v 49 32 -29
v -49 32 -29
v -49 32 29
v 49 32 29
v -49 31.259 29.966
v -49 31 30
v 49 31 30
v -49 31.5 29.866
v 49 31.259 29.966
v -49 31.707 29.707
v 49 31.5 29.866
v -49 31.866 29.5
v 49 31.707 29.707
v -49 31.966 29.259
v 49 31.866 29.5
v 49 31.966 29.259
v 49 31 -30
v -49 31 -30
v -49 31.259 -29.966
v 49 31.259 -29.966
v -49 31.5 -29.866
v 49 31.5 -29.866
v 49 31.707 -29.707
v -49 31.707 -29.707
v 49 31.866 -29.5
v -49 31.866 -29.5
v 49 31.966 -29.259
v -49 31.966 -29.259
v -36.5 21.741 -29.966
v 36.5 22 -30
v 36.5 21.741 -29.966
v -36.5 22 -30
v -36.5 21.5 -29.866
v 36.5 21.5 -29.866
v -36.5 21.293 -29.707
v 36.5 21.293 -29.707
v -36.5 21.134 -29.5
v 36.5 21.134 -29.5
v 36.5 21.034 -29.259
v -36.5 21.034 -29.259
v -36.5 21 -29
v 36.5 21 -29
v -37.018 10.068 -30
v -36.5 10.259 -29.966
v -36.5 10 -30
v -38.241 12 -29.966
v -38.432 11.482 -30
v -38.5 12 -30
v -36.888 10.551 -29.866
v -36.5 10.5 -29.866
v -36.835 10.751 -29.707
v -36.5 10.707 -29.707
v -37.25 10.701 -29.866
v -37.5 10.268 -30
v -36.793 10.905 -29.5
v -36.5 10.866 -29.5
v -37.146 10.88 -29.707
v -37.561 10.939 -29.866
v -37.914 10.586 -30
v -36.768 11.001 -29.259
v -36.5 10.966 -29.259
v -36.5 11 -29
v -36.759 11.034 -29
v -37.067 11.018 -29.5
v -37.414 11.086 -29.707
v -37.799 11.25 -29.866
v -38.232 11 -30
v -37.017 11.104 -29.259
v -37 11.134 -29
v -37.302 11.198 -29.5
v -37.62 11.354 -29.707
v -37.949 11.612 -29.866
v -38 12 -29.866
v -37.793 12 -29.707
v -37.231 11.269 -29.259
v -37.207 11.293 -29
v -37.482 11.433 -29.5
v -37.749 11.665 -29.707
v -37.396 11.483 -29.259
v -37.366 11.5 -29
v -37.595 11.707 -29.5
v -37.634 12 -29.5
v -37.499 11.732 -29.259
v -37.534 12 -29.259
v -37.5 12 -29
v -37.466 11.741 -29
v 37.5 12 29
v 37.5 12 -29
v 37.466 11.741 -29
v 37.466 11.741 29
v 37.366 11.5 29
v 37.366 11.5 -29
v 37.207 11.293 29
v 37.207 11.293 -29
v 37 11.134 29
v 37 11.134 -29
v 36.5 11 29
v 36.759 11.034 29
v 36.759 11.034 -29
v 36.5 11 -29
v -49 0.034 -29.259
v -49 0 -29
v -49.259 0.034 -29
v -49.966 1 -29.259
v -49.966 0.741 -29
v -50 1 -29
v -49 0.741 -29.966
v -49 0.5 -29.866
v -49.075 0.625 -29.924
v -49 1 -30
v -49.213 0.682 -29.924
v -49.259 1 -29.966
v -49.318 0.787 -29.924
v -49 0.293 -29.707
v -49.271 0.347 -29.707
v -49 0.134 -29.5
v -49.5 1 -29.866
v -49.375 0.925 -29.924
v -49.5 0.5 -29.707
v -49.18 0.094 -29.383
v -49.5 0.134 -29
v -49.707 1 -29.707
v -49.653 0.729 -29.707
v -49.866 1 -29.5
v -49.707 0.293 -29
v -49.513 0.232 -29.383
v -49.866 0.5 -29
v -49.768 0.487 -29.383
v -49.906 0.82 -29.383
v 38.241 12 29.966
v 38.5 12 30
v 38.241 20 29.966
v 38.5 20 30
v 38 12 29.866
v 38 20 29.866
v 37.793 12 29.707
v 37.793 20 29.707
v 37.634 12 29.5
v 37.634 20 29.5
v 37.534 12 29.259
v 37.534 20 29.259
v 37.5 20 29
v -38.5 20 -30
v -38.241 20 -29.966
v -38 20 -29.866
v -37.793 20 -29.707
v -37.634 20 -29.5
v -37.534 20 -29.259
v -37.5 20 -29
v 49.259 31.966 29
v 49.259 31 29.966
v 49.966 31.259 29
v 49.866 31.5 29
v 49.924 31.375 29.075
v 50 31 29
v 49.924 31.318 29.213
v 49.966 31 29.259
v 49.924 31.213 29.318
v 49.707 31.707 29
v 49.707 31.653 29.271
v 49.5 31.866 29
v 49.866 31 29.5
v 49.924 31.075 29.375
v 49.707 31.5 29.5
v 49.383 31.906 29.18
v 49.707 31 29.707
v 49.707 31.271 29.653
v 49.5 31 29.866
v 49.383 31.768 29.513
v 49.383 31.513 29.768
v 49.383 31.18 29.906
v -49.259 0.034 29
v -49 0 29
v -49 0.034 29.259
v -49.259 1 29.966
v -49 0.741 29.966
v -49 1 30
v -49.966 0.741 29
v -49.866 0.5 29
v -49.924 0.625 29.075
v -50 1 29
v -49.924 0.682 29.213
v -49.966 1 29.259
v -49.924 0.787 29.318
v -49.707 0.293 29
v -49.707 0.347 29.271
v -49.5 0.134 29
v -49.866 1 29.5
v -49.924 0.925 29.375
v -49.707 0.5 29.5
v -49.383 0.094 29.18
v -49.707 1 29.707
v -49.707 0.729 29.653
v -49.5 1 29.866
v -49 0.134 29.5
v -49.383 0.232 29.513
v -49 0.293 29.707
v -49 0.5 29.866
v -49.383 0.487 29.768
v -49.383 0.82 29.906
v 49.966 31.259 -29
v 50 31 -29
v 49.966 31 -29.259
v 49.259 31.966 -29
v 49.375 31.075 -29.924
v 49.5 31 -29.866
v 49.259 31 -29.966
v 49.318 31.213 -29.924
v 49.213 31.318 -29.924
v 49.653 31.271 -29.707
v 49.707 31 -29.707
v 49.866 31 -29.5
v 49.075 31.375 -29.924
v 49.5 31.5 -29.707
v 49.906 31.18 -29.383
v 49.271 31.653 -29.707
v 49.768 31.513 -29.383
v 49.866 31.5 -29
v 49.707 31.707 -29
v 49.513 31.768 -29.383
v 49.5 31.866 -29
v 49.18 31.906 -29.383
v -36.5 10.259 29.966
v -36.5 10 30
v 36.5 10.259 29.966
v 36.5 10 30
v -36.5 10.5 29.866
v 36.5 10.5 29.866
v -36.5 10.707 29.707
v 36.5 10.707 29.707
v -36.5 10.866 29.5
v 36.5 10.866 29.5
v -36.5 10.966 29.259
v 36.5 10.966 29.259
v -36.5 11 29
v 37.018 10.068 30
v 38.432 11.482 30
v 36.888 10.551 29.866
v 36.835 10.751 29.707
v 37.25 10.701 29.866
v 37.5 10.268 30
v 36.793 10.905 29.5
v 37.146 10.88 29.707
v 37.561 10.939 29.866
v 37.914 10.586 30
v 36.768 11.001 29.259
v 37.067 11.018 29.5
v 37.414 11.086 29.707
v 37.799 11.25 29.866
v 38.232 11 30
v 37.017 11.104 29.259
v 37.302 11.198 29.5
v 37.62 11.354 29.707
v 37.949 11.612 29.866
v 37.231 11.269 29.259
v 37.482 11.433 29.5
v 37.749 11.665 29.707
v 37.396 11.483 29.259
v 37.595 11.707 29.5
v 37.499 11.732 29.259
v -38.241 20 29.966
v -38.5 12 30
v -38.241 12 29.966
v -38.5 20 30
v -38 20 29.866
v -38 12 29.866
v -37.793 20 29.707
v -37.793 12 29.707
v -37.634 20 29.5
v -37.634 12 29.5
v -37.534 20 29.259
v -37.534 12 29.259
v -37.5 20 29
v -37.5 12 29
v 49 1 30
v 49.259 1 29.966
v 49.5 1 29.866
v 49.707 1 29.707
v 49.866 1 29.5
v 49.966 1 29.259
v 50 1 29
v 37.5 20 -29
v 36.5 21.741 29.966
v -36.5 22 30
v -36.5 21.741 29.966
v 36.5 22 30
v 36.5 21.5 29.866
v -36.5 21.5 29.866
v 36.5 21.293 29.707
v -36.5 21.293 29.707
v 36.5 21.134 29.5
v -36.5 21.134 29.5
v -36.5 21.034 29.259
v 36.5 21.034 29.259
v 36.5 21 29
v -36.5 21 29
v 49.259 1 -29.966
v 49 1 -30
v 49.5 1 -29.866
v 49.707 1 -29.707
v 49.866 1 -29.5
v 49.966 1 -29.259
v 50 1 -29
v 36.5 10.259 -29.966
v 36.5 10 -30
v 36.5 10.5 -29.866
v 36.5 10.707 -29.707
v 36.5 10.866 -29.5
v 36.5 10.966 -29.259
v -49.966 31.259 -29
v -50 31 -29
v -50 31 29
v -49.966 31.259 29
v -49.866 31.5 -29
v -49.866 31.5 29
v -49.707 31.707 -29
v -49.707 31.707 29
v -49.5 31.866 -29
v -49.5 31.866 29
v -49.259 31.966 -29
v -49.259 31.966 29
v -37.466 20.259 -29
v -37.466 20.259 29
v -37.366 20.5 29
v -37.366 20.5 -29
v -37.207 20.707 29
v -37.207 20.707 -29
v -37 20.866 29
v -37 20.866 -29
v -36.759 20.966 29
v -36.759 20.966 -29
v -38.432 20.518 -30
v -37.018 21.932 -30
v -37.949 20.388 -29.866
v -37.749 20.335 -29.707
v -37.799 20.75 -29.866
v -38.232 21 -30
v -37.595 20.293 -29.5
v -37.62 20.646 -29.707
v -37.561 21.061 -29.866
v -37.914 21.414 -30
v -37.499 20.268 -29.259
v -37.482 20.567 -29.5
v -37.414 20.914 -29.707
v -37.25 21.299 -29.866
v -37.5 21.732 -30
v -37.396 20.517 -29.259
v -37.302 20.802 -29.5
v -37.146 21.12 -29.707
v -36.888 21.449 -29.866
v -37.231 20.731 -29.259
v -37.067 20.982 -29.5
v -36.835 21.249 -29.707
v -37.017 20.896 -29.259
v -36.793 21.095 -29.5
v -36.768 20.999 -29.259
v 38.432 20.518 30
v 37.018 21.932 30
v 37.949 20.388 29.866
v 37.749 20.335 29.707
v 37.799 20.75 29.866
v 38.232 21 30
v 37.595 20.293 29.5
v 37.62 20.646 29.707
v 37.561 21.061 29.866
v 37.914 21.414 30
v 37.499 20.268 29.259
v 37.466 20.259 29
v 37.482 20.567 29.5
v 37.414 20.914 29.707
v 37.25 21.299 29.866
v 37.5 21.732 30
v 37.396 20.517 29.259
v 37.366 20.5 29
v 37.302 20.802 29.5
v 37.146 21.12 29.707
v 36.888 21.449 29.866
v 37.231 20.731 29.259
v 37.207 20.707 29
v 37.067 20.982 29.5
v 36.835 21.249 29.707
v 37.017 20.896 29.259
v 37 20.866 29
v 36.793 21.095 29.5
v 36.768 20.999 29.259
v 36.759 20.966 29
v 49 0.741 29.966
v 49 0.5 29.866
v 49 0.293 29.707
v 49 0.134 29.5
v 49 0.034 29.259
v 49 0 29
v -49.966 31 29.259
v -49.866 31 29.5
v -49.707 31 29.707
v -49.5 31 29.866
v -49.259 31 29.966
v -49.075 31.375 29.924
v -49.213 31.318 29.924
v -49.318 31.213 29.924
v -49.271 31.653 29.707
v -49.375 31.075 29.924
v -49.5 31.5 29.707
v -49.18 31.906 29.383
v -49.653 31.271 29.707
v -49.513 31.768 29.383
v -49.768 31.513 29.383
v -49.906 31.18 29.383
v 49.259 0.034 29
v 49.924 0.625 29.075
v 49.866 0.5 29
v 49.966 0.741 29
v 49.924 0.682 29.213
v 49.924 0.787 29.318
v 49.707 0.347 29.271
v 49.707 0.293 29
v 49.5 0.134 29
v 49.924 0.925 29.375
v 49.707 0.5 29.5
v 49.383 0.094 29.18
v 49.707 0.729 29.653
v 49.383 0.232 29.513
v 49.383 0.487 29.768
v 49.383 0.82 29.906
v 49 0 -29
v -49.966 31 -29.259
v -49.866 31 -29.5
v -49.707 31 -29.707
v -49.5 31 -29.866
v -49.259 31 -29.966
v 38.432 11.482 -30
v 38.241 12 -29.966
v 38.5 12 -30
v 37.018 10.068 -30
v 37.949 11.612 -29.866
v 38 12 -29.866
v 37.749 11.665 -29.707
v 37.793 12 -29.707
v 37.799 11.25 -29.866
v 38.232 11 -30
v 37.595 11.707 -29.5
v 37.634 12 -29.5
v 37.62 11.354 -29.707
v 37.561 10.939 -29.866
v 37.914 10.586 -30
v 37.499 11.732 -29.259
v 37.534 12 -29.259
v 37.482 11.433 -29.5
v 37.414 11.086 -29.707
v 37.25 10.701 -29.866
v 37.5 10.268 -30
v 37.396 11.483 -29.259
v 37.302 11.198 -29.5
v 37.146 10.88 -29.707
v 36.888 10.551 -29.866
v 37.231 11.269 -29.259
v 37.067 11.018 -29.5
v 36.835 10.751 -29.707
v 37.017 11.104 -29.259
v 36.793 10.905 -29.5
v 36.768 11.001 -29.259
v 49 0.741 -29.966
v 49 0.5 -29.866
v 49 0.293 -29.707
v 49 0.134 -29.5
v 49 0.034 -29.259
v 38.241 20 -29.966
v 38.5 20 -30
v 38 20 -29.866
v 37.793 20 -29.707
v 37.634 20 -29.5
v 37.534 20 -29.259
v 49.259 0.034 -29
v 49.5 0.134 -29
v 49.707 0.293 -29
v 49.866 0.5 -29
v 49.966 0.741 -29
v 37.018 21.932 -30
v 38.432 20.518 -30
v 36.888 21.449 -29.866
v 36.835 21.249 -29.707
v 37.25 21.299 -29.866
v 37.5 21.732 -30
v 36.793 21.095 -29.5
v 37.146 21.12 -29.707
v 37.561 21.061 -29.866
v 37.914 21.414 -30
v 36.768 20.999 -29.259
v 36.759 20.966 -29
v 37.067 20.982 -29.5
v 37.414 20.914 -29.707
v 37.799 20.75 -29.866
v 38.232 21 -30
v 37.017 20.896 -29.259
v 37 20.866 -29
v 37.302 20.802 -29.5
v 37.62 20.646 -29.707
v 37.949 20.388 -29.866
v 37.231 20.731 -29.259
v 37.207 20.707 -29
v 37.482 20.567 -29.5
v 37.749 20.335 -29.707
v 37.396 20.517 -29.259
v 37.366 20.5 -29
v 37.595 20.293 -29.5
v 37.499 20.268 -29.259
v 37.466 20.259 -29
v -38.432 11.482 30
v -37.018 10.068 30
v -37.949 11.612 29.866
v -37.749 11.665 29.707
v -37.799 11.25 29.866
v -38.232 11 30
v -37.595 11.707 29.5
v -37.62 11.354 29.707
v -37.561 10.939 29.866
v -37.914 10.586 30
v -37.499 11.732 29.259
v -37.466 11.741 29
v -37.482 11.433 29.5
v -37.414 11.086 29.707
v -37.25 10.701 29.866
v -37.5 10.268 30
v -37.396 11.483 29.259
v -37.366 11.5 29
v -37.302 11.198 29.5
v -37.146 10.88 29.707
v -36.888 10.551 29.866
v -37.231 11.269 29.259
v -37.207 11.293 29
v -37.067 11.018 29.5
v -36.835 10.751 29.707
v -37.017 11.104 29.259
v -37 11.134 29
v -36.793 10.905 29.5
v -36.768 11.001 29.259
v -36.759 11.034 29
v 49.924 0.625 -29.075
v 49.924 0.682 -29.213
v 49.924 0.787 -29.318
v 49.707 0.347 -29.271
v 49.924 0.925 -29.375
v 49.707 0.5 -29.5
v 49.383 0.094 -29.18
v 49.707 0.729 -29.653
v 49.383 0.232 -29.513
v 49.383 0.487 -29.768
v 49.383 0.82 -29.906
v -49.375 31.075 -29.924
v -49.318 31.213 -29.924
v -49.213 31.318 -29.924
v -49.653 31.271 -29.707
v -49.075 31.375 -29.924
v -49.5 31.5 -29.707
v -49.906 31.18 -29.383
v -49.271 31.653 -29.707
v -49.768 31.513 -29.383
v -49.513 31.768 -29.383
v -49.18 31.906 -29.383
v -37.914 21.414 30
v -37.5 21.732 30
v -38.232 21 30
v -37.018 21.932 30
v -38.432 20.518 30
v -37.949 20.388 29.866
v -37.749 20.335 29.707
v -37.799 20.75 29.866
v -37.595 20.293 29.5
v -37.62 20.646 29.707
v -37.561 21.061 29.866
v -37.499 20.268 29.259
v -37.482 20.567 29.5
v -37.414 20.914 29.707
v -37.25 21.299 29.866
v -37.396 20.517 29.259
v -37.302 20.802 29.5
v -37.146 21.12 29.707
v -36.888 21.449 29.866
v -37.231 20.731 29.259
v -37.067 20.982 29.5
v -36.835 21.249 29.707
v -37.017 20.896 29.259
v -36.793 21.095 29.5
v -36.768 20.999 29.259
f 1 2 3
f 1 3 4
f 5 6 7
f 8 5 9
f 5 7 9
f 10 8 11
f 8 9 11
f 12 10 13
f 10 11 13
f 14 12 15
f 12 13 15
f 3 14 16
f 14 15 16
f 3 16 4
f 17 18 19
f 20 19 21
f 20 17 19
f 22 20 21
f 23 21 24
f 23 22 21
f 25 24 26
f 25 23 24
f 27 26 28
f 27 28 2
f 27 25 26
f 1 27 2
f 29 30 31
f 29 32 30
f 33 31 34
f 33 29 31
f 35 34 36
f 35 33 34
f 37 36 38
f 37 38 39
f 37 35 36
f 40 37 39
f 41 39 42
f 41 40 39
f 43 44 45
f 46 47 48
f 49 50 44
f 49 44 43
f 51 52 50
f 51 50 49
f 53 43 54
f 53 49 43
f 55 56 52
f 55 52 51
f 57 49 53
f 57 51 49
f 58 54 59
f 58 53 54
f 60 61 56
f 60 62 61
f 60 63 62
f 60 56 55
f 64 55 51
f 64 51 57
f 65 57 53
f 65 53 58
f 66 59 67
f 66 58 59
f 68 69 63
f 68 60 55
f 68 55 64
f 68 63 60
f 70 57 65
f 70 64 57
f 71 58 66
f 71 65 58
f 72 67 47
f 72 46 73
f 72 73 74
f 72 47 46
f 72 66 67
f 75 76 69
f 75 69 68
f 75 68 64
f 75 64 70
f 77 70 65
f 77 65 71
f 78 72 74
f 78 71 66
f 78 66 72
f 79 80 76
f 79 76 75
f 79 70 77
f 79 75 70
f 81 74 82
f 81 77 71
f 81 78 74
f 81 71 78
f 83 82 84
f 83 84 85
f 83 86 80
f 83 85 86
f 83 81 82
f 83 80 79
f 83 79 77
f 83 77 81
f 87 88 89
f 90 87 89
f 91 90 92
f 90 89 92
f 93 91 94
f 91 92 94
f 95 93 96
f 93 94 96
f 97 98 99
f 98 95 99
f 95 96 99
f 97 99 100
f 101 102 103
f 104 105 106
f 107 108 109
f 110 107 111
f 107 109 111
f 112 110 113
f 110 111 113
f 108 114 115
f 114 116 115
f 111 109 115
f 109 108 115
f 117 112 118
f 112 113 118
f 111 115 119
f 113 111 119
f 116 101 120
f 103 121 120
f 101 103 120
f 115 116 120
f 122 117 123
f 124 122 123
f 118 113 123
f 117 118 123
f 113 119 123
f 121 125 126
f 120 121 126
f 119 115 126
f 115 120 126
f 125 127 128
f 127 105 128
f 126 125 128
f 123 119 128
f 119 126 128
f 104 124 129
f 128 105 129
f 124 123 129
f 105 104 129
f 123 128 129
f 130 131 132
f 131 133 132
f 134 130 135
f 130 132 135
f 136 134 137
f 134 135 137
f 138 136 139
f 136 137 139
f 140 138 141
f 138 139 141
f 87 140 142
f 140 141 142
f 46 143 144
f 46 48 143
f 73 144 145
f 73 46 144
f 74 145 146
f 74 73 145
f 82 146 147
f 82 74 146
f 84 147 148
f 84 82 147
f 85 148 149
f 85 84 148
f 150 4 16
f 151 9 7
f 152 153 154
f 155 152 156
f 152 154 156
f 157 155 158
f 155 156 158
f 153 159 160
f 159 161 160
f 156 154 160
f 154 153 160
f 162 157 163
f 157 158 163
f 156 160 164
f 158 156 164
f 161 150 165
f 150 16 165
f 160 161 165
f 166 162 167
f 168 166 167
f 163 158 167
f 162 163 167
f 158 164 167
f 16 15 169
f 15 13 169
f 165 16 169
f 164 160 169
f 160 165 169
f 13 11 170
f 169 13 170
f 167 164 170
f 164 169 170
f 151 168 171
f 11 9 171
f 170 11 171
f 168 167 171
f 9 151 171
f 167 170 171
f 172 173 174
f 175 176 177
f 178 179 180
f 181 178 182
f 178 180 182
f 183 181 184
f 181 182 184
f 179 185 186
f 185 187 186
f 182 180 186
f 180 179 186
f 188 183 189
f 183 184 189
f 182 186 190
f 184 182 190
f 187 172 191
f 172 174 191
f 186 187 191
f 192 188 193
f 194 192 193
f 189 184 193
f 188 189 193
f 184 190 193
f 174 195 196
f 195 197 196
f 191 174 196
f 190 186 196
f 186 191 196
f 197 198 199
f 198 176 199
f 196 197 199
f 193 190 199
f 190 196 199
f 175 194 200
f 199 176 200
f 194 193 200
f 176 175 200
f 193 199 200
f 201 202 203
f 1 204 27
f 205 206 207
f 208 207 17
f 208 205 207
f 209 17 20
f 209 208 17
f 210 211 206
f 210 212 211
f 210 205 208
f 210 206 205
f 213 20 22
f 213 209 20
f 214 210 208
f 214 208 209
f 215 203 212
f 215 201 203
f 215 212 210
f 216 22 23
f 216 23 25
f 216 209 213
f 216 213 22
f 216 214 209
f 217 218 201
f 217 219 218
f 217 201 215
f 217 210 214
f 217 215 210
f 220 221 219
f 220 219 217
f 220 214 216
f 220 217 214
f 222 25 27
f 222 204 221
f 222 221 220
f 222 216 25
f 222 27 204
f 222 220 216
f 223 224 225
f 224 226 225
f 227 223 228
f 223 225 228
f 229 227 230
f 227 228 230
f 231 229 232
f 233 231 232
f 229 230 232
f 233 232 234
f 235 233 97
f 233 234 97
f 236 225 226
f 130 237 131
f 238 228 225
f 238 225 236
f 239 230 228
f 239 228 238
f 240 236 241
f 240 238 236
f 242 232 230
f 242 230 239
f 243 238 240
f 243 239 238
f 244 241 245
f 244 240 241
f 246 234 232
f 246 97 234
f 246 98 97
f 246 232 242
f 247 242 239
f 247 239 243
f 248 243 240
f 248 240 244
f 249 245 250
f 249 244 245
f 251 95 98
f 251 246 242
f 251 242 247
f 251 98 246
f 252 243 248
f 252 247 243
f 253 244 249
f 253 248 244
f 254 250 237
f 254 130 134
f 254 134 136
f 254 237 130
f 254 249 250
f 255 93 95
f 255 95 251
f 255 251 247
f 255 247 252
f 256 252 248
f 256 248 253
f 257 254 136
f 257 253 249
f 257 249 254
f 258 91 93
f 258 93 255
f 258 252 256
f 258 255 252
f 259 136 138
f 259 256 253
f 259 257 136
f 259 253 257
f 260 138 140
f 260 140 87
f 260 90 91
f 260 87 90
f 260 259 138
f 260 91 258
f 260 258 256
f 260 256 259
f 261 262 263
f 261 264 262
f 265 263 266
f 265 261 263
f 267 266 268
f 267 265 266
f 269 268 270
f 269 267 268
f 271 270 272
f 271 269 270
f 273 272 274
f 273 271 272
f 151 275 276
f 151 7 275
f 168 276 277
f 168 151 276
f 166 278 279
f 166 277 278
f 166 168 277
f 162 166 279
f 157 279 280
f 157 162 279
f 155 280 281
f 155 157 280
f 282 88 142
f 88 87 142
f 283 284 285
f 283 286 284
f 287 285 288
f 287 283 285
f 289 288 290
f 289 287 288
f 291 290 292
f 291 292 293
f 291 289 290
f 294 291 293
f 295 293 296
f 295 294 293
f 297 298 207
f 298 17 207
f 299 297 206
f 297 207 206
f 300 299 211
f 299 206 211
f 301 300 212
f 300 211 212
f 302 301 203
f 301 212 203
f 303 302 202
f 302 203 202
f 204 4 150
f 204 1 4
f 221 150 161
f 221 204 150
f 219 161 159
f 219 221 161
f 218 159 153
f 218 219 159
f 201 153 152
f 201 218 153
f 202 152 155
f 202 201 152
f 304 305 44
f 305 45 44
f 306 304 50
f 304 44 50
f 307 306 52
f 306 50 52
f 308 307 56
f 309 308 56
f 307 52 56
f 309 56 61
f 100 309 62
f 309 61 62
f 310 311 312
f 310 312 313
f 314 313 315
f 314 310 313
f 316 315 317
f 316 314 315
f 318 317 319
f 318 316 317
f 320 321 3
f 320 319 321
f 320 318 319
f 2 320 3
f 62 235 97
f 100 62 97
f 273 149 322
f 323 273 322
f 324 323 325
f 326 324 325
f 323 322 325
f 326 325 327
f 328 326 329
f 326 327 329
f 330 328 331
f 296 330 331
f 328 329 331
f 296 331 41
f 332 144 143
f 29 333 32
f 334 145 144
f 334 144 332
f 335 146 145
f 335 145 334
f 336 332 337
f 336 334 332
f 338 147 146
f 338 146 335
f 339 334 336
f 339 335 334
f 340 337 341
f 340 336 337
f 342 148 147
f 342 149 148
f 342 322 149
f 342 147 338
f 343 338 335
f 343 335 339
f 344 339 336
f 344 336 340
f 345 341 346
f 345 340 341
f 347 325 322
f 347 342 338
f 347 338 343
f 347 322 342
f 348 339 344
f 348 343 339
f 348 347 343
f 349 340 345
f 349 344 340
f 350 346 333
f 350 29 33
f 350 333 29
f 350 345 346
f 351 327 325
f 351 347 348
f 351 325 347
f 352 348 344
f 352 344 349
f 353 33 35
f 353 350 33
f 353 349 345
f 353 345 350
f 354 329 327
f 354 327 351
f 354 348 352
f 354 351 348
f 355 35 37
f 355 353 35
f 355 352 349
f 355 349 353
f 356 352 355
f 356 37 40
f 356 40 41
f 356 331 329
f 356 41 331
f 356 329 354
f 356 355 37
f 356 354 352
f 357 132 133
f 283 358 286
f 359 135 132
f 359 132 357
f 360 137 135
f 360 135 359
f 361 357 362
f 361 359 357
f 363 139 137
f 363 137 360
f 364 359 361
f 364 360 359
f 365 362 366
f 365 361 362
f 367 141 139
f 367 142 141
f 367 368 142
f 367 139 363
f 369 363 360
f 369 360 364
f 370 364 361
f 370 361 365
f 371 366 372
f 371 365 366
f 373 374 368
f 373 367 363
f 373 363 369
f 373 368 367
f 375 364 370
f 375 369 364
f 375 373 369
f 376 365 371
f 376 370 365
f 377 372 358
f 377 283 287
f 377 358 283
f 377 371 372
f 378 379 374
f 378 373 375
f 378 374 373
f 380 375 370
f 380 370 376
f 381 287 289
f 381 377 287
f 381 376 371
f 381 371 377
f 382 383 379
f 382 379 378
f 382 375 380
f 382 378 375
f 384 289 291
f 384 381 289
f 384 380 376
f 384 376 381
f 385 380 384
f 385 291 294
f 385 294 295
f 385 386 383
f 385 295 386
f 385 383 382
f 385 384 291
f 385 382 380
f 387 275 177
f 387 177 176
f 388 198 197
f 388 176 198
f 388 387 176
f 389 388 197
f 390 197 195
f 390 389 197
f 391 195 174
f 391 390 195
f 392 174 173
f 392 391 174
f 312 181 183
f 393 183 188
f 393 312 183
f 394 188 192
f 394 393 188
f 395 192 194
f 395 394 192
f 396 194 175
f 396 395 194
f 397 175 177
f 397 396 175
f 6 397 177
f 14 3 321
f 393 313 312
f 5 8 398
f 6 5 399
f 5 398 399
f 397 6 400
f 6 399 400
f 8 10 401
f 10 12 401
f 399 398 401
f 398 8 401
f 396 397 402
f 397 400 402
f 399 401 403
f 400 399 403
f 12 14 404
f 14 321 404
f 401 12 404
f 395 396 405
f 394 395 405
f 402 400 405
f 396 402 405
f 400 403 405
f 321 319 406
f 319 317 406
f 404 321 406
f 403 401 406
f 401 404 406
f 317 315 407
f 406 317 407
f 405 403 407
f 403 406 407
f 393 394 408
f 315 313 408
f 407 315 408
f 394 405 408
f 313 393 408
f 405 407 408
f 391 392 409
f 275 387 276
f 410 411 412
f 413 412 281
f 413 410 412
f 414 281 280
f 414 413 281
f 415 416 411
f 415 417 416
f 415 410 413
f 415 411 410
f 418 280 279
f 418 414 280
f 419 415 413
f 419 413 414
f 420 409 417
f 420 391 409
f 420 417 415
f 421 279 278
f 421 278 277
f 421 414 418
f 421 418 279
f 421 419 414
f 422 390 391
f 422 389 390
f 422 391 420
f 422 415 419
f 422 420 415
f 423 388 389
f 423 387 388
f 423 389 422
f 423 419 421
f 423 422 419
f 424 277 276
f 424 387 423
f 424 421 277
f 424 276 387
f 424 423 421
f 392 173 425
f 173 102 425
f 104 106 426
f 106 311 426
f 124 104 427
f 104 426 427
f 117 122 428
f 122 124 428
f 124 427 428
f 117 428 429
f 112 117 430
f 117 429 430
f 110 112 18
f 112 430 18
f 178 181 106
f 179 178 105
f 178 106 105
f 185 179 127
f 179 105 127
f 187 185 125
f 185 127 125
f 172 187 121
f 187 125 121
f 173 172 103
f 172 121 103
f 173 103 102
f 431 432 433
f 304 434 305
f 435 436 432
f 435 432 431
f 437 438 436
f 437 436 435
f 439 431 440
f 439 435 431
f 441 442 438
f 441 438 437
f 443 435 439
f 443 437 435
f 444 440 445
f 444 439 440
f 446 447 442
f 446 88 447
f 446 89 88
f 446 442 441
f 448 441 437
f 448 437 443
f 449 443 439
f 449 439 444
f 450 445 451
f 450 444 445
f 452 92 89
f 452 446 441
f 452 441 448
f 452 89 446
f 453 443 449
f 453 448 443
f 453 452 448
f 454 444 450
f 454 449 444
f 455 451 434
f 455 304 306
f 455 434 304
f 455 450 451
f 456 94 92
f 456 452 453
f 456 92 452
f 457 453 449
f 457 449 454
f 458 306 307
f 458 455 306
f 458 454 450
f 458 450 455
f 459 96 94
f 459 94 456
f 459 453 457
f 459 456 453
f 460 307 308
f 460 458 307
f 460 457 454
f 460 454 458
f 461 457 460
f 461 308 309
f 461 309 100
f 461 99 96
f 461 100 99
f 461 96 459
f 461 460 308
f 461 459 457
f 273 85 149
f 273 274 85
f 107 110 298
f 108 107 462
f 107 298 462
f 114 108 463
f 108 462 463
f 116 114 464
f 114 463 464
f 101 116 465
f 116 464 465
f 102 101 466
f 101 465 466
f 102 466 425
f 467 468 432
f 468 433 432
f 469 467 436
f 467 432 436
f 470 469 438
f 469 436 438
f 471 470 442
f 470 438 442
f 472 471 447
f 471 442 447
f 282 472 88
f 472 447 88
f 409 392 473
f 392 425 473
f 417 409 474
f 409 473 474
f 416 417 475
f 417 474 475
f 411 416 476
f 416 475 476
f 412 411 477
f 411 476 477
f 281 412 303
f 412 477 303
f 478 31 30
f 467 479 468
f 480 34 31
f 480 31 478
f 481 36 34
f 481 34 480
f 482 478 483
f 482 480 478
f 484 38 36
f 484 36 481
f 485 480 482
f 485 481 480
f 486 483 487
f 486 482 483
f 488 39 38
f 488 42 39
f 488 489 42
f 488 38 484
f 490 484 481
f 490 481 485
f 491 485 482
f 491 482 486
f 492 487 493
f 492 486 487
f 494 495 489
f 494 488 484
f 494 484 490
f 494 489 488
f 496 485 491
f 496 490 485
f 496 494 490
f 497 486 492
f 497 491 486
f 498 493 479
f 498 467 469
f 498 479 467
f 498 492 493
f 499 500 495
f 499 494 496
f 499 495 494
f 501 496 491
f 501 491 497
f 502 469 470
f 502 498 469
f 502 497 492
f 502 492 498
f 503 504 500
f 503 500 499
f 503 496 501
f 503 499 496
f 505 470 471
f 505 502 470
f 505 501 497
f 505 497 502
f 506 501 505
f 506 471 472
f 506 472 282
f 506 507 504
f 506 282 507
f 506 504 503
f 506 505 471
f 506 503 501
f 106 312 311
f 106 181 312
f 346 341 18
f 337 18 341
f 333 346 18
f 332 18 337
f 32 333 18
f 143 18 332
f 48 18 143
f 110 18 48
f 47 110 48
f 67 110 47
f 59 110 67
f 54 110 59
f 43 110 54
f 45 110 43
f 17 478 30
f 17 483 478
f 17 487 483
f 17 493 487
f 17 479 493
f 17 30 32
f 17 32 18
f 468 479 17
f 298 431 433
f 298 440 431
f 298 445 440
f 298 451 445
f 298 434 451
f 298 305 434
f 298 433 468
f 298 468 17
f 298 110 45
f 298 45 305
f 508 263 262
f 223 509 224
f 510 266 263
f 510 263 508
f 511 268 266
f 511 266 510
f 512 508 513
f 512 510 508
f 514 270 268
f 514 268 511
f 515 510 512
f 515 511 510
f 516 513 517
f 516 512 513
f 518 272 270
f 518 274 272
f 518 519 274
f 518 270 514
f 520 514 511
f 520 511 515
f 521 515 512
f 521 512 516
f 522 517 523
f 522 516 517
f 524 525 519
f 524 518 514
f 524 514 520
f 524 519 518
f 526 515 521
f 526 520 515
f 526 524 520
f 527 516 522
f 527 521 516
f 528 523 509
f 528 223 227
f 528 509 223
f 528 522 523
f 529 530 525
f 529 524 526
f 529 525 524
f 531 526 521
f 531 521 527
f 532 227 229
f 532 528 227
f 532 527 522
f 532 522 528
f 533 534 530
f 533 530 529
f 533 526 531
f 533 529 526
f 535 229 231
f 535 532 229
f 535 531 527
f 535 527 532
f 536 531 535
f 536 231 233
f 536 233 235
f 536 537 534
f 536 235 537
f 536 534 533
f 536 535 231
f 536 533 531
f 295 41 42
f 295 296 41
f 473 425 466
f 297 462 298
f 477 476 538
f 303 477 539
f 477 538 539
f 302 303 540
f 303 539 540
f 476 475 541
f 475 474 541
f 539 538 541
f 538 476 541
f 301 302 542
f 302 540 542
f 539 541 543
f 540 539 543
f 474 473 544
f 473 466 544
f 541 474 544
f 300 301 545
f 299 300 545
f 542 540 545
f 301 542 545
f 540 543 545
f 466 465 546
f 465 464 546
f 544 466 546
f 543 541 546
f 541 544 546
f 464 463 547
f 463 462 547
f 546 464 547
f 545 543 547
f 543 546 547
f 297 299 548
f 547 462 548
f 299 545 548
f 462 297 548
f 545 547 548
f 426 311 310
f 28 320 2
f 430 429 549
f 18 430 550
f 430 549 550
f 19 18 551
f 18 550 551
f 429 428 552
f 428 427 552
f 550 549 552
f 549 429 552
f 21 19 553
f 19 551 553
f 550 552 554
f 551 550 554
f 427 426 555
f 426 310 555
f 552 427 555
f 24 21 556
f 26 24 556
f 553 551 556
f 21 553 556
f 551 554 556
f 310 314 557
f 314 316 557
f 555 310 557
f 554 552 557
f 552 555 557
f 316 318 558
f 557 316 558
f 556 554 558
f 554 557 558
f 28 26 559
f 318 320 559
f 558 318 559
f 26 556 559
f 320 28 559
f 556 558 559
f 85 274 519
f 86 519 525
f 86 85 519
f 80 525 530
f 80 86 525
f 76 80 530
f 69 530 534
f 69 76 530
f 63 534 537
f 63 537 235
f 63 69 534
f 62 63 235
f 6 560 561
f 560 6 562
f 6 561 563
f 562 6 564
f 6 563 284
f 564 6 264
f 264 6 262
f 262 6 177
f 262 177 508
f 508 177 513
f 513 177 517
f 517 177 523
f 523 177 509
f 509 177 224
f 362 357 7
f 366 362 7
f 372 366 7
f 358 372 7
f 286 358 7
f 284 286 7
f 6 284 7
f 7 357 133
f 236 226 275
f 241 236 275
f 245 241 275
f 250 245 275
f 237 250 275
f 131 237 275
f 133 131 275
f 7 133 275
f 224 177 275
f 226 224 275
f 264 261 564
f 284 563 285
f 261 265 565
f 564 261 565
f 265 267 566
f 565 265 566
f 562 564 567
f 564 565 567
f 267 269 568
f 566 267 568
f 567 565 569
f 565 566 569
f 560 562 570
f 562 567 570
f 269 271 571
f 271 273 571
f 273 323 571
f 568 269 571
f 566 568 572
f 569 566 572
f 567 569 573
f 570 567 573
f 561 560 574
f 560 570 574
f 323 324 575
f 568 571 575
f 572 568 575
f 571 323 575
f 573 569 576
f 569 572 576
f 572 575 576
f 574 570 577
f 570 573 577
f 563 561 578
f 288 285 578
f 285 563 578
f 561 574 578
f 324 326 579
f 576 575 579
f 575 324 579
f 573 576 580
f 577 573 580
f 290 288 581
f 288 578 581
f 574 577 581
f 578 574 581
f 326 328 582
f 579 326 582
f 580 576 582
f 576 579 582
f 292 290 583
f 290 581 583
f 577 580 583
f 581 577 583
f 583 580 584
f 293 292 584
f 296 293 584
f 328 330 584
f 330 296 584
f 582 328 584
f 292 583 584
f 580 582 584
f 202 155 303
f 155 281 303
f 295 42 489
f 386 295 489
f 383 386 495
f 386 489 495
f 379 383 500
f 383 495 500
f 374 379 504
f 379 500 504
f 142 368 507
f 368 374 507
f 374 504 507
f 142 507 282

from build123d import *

# Parameters (mm, degrees)
SKETCH1_W           = 100
SKETCH1_H           = 60
BOSS_EXTRUDE1_DEPTH = 32
SKETCH2_W           = 75
SKETCH2_H           = 10
CUT_EXTRUDE1_DEPTH  = 85.403791384
FILLET2_R           = 1


with BuildPart() as part:
    # Sketch1 → Boss-Extrude1 (new body)
    with BuildSketch(Plane(origin=(0, 0, 0), x_dir=(1, 0, 0), z_dir=(0, 1, 0))):
        Rectangle(SKETCH1_W, SKETCH1_H)
    extrude(amount=BOSS_EXTRUDE1_DEPTH)

    # Sketch2 → Cut-Extrude1 (cut, through all)
    with BuildSketch(Plane.XY.offset(30)):
        with Locations((0, 16)):
            Rectangle(SKETCH2_W, SKETCH2_H)
    extrude(amount=-CUT_EXTRUDE1_DEPTH, mode=Mode.SUBTRACT)

    # Fillet2
    fillet2_edges = [part.edges().sort_by_distance(p)[0] for p in [
        (-50, 32, 0),
        (0, 32, 30),
        (-37.5, 16, -30),
        (-37.5, 11, 0),
        (0, 21, -30),
        (-37.5, 21, 0),
        (37.5, 16, -30),
        (37.5, 21, 0),
        (0, 11, -30),
        (37.5, 11, 0),
        (-37.5, 16, 30),
        (0, 11, 30),
        (37.5, 16, 30),
        (0, 21, 30),
        (50, 32, 0),
        (0, 0, 30),
        (-50, 0, 0),
        (0, 0, -30),
        (50, 0, 0),
        (50, 16, 30),
        (-50, 16, 30),
        (-50, 16, -30),
        (50, 16, -30),
        (0, 32, -30),
    ]]
    fillet(fillet2_edges, radius=FILLET2_R)


solid = part.part
